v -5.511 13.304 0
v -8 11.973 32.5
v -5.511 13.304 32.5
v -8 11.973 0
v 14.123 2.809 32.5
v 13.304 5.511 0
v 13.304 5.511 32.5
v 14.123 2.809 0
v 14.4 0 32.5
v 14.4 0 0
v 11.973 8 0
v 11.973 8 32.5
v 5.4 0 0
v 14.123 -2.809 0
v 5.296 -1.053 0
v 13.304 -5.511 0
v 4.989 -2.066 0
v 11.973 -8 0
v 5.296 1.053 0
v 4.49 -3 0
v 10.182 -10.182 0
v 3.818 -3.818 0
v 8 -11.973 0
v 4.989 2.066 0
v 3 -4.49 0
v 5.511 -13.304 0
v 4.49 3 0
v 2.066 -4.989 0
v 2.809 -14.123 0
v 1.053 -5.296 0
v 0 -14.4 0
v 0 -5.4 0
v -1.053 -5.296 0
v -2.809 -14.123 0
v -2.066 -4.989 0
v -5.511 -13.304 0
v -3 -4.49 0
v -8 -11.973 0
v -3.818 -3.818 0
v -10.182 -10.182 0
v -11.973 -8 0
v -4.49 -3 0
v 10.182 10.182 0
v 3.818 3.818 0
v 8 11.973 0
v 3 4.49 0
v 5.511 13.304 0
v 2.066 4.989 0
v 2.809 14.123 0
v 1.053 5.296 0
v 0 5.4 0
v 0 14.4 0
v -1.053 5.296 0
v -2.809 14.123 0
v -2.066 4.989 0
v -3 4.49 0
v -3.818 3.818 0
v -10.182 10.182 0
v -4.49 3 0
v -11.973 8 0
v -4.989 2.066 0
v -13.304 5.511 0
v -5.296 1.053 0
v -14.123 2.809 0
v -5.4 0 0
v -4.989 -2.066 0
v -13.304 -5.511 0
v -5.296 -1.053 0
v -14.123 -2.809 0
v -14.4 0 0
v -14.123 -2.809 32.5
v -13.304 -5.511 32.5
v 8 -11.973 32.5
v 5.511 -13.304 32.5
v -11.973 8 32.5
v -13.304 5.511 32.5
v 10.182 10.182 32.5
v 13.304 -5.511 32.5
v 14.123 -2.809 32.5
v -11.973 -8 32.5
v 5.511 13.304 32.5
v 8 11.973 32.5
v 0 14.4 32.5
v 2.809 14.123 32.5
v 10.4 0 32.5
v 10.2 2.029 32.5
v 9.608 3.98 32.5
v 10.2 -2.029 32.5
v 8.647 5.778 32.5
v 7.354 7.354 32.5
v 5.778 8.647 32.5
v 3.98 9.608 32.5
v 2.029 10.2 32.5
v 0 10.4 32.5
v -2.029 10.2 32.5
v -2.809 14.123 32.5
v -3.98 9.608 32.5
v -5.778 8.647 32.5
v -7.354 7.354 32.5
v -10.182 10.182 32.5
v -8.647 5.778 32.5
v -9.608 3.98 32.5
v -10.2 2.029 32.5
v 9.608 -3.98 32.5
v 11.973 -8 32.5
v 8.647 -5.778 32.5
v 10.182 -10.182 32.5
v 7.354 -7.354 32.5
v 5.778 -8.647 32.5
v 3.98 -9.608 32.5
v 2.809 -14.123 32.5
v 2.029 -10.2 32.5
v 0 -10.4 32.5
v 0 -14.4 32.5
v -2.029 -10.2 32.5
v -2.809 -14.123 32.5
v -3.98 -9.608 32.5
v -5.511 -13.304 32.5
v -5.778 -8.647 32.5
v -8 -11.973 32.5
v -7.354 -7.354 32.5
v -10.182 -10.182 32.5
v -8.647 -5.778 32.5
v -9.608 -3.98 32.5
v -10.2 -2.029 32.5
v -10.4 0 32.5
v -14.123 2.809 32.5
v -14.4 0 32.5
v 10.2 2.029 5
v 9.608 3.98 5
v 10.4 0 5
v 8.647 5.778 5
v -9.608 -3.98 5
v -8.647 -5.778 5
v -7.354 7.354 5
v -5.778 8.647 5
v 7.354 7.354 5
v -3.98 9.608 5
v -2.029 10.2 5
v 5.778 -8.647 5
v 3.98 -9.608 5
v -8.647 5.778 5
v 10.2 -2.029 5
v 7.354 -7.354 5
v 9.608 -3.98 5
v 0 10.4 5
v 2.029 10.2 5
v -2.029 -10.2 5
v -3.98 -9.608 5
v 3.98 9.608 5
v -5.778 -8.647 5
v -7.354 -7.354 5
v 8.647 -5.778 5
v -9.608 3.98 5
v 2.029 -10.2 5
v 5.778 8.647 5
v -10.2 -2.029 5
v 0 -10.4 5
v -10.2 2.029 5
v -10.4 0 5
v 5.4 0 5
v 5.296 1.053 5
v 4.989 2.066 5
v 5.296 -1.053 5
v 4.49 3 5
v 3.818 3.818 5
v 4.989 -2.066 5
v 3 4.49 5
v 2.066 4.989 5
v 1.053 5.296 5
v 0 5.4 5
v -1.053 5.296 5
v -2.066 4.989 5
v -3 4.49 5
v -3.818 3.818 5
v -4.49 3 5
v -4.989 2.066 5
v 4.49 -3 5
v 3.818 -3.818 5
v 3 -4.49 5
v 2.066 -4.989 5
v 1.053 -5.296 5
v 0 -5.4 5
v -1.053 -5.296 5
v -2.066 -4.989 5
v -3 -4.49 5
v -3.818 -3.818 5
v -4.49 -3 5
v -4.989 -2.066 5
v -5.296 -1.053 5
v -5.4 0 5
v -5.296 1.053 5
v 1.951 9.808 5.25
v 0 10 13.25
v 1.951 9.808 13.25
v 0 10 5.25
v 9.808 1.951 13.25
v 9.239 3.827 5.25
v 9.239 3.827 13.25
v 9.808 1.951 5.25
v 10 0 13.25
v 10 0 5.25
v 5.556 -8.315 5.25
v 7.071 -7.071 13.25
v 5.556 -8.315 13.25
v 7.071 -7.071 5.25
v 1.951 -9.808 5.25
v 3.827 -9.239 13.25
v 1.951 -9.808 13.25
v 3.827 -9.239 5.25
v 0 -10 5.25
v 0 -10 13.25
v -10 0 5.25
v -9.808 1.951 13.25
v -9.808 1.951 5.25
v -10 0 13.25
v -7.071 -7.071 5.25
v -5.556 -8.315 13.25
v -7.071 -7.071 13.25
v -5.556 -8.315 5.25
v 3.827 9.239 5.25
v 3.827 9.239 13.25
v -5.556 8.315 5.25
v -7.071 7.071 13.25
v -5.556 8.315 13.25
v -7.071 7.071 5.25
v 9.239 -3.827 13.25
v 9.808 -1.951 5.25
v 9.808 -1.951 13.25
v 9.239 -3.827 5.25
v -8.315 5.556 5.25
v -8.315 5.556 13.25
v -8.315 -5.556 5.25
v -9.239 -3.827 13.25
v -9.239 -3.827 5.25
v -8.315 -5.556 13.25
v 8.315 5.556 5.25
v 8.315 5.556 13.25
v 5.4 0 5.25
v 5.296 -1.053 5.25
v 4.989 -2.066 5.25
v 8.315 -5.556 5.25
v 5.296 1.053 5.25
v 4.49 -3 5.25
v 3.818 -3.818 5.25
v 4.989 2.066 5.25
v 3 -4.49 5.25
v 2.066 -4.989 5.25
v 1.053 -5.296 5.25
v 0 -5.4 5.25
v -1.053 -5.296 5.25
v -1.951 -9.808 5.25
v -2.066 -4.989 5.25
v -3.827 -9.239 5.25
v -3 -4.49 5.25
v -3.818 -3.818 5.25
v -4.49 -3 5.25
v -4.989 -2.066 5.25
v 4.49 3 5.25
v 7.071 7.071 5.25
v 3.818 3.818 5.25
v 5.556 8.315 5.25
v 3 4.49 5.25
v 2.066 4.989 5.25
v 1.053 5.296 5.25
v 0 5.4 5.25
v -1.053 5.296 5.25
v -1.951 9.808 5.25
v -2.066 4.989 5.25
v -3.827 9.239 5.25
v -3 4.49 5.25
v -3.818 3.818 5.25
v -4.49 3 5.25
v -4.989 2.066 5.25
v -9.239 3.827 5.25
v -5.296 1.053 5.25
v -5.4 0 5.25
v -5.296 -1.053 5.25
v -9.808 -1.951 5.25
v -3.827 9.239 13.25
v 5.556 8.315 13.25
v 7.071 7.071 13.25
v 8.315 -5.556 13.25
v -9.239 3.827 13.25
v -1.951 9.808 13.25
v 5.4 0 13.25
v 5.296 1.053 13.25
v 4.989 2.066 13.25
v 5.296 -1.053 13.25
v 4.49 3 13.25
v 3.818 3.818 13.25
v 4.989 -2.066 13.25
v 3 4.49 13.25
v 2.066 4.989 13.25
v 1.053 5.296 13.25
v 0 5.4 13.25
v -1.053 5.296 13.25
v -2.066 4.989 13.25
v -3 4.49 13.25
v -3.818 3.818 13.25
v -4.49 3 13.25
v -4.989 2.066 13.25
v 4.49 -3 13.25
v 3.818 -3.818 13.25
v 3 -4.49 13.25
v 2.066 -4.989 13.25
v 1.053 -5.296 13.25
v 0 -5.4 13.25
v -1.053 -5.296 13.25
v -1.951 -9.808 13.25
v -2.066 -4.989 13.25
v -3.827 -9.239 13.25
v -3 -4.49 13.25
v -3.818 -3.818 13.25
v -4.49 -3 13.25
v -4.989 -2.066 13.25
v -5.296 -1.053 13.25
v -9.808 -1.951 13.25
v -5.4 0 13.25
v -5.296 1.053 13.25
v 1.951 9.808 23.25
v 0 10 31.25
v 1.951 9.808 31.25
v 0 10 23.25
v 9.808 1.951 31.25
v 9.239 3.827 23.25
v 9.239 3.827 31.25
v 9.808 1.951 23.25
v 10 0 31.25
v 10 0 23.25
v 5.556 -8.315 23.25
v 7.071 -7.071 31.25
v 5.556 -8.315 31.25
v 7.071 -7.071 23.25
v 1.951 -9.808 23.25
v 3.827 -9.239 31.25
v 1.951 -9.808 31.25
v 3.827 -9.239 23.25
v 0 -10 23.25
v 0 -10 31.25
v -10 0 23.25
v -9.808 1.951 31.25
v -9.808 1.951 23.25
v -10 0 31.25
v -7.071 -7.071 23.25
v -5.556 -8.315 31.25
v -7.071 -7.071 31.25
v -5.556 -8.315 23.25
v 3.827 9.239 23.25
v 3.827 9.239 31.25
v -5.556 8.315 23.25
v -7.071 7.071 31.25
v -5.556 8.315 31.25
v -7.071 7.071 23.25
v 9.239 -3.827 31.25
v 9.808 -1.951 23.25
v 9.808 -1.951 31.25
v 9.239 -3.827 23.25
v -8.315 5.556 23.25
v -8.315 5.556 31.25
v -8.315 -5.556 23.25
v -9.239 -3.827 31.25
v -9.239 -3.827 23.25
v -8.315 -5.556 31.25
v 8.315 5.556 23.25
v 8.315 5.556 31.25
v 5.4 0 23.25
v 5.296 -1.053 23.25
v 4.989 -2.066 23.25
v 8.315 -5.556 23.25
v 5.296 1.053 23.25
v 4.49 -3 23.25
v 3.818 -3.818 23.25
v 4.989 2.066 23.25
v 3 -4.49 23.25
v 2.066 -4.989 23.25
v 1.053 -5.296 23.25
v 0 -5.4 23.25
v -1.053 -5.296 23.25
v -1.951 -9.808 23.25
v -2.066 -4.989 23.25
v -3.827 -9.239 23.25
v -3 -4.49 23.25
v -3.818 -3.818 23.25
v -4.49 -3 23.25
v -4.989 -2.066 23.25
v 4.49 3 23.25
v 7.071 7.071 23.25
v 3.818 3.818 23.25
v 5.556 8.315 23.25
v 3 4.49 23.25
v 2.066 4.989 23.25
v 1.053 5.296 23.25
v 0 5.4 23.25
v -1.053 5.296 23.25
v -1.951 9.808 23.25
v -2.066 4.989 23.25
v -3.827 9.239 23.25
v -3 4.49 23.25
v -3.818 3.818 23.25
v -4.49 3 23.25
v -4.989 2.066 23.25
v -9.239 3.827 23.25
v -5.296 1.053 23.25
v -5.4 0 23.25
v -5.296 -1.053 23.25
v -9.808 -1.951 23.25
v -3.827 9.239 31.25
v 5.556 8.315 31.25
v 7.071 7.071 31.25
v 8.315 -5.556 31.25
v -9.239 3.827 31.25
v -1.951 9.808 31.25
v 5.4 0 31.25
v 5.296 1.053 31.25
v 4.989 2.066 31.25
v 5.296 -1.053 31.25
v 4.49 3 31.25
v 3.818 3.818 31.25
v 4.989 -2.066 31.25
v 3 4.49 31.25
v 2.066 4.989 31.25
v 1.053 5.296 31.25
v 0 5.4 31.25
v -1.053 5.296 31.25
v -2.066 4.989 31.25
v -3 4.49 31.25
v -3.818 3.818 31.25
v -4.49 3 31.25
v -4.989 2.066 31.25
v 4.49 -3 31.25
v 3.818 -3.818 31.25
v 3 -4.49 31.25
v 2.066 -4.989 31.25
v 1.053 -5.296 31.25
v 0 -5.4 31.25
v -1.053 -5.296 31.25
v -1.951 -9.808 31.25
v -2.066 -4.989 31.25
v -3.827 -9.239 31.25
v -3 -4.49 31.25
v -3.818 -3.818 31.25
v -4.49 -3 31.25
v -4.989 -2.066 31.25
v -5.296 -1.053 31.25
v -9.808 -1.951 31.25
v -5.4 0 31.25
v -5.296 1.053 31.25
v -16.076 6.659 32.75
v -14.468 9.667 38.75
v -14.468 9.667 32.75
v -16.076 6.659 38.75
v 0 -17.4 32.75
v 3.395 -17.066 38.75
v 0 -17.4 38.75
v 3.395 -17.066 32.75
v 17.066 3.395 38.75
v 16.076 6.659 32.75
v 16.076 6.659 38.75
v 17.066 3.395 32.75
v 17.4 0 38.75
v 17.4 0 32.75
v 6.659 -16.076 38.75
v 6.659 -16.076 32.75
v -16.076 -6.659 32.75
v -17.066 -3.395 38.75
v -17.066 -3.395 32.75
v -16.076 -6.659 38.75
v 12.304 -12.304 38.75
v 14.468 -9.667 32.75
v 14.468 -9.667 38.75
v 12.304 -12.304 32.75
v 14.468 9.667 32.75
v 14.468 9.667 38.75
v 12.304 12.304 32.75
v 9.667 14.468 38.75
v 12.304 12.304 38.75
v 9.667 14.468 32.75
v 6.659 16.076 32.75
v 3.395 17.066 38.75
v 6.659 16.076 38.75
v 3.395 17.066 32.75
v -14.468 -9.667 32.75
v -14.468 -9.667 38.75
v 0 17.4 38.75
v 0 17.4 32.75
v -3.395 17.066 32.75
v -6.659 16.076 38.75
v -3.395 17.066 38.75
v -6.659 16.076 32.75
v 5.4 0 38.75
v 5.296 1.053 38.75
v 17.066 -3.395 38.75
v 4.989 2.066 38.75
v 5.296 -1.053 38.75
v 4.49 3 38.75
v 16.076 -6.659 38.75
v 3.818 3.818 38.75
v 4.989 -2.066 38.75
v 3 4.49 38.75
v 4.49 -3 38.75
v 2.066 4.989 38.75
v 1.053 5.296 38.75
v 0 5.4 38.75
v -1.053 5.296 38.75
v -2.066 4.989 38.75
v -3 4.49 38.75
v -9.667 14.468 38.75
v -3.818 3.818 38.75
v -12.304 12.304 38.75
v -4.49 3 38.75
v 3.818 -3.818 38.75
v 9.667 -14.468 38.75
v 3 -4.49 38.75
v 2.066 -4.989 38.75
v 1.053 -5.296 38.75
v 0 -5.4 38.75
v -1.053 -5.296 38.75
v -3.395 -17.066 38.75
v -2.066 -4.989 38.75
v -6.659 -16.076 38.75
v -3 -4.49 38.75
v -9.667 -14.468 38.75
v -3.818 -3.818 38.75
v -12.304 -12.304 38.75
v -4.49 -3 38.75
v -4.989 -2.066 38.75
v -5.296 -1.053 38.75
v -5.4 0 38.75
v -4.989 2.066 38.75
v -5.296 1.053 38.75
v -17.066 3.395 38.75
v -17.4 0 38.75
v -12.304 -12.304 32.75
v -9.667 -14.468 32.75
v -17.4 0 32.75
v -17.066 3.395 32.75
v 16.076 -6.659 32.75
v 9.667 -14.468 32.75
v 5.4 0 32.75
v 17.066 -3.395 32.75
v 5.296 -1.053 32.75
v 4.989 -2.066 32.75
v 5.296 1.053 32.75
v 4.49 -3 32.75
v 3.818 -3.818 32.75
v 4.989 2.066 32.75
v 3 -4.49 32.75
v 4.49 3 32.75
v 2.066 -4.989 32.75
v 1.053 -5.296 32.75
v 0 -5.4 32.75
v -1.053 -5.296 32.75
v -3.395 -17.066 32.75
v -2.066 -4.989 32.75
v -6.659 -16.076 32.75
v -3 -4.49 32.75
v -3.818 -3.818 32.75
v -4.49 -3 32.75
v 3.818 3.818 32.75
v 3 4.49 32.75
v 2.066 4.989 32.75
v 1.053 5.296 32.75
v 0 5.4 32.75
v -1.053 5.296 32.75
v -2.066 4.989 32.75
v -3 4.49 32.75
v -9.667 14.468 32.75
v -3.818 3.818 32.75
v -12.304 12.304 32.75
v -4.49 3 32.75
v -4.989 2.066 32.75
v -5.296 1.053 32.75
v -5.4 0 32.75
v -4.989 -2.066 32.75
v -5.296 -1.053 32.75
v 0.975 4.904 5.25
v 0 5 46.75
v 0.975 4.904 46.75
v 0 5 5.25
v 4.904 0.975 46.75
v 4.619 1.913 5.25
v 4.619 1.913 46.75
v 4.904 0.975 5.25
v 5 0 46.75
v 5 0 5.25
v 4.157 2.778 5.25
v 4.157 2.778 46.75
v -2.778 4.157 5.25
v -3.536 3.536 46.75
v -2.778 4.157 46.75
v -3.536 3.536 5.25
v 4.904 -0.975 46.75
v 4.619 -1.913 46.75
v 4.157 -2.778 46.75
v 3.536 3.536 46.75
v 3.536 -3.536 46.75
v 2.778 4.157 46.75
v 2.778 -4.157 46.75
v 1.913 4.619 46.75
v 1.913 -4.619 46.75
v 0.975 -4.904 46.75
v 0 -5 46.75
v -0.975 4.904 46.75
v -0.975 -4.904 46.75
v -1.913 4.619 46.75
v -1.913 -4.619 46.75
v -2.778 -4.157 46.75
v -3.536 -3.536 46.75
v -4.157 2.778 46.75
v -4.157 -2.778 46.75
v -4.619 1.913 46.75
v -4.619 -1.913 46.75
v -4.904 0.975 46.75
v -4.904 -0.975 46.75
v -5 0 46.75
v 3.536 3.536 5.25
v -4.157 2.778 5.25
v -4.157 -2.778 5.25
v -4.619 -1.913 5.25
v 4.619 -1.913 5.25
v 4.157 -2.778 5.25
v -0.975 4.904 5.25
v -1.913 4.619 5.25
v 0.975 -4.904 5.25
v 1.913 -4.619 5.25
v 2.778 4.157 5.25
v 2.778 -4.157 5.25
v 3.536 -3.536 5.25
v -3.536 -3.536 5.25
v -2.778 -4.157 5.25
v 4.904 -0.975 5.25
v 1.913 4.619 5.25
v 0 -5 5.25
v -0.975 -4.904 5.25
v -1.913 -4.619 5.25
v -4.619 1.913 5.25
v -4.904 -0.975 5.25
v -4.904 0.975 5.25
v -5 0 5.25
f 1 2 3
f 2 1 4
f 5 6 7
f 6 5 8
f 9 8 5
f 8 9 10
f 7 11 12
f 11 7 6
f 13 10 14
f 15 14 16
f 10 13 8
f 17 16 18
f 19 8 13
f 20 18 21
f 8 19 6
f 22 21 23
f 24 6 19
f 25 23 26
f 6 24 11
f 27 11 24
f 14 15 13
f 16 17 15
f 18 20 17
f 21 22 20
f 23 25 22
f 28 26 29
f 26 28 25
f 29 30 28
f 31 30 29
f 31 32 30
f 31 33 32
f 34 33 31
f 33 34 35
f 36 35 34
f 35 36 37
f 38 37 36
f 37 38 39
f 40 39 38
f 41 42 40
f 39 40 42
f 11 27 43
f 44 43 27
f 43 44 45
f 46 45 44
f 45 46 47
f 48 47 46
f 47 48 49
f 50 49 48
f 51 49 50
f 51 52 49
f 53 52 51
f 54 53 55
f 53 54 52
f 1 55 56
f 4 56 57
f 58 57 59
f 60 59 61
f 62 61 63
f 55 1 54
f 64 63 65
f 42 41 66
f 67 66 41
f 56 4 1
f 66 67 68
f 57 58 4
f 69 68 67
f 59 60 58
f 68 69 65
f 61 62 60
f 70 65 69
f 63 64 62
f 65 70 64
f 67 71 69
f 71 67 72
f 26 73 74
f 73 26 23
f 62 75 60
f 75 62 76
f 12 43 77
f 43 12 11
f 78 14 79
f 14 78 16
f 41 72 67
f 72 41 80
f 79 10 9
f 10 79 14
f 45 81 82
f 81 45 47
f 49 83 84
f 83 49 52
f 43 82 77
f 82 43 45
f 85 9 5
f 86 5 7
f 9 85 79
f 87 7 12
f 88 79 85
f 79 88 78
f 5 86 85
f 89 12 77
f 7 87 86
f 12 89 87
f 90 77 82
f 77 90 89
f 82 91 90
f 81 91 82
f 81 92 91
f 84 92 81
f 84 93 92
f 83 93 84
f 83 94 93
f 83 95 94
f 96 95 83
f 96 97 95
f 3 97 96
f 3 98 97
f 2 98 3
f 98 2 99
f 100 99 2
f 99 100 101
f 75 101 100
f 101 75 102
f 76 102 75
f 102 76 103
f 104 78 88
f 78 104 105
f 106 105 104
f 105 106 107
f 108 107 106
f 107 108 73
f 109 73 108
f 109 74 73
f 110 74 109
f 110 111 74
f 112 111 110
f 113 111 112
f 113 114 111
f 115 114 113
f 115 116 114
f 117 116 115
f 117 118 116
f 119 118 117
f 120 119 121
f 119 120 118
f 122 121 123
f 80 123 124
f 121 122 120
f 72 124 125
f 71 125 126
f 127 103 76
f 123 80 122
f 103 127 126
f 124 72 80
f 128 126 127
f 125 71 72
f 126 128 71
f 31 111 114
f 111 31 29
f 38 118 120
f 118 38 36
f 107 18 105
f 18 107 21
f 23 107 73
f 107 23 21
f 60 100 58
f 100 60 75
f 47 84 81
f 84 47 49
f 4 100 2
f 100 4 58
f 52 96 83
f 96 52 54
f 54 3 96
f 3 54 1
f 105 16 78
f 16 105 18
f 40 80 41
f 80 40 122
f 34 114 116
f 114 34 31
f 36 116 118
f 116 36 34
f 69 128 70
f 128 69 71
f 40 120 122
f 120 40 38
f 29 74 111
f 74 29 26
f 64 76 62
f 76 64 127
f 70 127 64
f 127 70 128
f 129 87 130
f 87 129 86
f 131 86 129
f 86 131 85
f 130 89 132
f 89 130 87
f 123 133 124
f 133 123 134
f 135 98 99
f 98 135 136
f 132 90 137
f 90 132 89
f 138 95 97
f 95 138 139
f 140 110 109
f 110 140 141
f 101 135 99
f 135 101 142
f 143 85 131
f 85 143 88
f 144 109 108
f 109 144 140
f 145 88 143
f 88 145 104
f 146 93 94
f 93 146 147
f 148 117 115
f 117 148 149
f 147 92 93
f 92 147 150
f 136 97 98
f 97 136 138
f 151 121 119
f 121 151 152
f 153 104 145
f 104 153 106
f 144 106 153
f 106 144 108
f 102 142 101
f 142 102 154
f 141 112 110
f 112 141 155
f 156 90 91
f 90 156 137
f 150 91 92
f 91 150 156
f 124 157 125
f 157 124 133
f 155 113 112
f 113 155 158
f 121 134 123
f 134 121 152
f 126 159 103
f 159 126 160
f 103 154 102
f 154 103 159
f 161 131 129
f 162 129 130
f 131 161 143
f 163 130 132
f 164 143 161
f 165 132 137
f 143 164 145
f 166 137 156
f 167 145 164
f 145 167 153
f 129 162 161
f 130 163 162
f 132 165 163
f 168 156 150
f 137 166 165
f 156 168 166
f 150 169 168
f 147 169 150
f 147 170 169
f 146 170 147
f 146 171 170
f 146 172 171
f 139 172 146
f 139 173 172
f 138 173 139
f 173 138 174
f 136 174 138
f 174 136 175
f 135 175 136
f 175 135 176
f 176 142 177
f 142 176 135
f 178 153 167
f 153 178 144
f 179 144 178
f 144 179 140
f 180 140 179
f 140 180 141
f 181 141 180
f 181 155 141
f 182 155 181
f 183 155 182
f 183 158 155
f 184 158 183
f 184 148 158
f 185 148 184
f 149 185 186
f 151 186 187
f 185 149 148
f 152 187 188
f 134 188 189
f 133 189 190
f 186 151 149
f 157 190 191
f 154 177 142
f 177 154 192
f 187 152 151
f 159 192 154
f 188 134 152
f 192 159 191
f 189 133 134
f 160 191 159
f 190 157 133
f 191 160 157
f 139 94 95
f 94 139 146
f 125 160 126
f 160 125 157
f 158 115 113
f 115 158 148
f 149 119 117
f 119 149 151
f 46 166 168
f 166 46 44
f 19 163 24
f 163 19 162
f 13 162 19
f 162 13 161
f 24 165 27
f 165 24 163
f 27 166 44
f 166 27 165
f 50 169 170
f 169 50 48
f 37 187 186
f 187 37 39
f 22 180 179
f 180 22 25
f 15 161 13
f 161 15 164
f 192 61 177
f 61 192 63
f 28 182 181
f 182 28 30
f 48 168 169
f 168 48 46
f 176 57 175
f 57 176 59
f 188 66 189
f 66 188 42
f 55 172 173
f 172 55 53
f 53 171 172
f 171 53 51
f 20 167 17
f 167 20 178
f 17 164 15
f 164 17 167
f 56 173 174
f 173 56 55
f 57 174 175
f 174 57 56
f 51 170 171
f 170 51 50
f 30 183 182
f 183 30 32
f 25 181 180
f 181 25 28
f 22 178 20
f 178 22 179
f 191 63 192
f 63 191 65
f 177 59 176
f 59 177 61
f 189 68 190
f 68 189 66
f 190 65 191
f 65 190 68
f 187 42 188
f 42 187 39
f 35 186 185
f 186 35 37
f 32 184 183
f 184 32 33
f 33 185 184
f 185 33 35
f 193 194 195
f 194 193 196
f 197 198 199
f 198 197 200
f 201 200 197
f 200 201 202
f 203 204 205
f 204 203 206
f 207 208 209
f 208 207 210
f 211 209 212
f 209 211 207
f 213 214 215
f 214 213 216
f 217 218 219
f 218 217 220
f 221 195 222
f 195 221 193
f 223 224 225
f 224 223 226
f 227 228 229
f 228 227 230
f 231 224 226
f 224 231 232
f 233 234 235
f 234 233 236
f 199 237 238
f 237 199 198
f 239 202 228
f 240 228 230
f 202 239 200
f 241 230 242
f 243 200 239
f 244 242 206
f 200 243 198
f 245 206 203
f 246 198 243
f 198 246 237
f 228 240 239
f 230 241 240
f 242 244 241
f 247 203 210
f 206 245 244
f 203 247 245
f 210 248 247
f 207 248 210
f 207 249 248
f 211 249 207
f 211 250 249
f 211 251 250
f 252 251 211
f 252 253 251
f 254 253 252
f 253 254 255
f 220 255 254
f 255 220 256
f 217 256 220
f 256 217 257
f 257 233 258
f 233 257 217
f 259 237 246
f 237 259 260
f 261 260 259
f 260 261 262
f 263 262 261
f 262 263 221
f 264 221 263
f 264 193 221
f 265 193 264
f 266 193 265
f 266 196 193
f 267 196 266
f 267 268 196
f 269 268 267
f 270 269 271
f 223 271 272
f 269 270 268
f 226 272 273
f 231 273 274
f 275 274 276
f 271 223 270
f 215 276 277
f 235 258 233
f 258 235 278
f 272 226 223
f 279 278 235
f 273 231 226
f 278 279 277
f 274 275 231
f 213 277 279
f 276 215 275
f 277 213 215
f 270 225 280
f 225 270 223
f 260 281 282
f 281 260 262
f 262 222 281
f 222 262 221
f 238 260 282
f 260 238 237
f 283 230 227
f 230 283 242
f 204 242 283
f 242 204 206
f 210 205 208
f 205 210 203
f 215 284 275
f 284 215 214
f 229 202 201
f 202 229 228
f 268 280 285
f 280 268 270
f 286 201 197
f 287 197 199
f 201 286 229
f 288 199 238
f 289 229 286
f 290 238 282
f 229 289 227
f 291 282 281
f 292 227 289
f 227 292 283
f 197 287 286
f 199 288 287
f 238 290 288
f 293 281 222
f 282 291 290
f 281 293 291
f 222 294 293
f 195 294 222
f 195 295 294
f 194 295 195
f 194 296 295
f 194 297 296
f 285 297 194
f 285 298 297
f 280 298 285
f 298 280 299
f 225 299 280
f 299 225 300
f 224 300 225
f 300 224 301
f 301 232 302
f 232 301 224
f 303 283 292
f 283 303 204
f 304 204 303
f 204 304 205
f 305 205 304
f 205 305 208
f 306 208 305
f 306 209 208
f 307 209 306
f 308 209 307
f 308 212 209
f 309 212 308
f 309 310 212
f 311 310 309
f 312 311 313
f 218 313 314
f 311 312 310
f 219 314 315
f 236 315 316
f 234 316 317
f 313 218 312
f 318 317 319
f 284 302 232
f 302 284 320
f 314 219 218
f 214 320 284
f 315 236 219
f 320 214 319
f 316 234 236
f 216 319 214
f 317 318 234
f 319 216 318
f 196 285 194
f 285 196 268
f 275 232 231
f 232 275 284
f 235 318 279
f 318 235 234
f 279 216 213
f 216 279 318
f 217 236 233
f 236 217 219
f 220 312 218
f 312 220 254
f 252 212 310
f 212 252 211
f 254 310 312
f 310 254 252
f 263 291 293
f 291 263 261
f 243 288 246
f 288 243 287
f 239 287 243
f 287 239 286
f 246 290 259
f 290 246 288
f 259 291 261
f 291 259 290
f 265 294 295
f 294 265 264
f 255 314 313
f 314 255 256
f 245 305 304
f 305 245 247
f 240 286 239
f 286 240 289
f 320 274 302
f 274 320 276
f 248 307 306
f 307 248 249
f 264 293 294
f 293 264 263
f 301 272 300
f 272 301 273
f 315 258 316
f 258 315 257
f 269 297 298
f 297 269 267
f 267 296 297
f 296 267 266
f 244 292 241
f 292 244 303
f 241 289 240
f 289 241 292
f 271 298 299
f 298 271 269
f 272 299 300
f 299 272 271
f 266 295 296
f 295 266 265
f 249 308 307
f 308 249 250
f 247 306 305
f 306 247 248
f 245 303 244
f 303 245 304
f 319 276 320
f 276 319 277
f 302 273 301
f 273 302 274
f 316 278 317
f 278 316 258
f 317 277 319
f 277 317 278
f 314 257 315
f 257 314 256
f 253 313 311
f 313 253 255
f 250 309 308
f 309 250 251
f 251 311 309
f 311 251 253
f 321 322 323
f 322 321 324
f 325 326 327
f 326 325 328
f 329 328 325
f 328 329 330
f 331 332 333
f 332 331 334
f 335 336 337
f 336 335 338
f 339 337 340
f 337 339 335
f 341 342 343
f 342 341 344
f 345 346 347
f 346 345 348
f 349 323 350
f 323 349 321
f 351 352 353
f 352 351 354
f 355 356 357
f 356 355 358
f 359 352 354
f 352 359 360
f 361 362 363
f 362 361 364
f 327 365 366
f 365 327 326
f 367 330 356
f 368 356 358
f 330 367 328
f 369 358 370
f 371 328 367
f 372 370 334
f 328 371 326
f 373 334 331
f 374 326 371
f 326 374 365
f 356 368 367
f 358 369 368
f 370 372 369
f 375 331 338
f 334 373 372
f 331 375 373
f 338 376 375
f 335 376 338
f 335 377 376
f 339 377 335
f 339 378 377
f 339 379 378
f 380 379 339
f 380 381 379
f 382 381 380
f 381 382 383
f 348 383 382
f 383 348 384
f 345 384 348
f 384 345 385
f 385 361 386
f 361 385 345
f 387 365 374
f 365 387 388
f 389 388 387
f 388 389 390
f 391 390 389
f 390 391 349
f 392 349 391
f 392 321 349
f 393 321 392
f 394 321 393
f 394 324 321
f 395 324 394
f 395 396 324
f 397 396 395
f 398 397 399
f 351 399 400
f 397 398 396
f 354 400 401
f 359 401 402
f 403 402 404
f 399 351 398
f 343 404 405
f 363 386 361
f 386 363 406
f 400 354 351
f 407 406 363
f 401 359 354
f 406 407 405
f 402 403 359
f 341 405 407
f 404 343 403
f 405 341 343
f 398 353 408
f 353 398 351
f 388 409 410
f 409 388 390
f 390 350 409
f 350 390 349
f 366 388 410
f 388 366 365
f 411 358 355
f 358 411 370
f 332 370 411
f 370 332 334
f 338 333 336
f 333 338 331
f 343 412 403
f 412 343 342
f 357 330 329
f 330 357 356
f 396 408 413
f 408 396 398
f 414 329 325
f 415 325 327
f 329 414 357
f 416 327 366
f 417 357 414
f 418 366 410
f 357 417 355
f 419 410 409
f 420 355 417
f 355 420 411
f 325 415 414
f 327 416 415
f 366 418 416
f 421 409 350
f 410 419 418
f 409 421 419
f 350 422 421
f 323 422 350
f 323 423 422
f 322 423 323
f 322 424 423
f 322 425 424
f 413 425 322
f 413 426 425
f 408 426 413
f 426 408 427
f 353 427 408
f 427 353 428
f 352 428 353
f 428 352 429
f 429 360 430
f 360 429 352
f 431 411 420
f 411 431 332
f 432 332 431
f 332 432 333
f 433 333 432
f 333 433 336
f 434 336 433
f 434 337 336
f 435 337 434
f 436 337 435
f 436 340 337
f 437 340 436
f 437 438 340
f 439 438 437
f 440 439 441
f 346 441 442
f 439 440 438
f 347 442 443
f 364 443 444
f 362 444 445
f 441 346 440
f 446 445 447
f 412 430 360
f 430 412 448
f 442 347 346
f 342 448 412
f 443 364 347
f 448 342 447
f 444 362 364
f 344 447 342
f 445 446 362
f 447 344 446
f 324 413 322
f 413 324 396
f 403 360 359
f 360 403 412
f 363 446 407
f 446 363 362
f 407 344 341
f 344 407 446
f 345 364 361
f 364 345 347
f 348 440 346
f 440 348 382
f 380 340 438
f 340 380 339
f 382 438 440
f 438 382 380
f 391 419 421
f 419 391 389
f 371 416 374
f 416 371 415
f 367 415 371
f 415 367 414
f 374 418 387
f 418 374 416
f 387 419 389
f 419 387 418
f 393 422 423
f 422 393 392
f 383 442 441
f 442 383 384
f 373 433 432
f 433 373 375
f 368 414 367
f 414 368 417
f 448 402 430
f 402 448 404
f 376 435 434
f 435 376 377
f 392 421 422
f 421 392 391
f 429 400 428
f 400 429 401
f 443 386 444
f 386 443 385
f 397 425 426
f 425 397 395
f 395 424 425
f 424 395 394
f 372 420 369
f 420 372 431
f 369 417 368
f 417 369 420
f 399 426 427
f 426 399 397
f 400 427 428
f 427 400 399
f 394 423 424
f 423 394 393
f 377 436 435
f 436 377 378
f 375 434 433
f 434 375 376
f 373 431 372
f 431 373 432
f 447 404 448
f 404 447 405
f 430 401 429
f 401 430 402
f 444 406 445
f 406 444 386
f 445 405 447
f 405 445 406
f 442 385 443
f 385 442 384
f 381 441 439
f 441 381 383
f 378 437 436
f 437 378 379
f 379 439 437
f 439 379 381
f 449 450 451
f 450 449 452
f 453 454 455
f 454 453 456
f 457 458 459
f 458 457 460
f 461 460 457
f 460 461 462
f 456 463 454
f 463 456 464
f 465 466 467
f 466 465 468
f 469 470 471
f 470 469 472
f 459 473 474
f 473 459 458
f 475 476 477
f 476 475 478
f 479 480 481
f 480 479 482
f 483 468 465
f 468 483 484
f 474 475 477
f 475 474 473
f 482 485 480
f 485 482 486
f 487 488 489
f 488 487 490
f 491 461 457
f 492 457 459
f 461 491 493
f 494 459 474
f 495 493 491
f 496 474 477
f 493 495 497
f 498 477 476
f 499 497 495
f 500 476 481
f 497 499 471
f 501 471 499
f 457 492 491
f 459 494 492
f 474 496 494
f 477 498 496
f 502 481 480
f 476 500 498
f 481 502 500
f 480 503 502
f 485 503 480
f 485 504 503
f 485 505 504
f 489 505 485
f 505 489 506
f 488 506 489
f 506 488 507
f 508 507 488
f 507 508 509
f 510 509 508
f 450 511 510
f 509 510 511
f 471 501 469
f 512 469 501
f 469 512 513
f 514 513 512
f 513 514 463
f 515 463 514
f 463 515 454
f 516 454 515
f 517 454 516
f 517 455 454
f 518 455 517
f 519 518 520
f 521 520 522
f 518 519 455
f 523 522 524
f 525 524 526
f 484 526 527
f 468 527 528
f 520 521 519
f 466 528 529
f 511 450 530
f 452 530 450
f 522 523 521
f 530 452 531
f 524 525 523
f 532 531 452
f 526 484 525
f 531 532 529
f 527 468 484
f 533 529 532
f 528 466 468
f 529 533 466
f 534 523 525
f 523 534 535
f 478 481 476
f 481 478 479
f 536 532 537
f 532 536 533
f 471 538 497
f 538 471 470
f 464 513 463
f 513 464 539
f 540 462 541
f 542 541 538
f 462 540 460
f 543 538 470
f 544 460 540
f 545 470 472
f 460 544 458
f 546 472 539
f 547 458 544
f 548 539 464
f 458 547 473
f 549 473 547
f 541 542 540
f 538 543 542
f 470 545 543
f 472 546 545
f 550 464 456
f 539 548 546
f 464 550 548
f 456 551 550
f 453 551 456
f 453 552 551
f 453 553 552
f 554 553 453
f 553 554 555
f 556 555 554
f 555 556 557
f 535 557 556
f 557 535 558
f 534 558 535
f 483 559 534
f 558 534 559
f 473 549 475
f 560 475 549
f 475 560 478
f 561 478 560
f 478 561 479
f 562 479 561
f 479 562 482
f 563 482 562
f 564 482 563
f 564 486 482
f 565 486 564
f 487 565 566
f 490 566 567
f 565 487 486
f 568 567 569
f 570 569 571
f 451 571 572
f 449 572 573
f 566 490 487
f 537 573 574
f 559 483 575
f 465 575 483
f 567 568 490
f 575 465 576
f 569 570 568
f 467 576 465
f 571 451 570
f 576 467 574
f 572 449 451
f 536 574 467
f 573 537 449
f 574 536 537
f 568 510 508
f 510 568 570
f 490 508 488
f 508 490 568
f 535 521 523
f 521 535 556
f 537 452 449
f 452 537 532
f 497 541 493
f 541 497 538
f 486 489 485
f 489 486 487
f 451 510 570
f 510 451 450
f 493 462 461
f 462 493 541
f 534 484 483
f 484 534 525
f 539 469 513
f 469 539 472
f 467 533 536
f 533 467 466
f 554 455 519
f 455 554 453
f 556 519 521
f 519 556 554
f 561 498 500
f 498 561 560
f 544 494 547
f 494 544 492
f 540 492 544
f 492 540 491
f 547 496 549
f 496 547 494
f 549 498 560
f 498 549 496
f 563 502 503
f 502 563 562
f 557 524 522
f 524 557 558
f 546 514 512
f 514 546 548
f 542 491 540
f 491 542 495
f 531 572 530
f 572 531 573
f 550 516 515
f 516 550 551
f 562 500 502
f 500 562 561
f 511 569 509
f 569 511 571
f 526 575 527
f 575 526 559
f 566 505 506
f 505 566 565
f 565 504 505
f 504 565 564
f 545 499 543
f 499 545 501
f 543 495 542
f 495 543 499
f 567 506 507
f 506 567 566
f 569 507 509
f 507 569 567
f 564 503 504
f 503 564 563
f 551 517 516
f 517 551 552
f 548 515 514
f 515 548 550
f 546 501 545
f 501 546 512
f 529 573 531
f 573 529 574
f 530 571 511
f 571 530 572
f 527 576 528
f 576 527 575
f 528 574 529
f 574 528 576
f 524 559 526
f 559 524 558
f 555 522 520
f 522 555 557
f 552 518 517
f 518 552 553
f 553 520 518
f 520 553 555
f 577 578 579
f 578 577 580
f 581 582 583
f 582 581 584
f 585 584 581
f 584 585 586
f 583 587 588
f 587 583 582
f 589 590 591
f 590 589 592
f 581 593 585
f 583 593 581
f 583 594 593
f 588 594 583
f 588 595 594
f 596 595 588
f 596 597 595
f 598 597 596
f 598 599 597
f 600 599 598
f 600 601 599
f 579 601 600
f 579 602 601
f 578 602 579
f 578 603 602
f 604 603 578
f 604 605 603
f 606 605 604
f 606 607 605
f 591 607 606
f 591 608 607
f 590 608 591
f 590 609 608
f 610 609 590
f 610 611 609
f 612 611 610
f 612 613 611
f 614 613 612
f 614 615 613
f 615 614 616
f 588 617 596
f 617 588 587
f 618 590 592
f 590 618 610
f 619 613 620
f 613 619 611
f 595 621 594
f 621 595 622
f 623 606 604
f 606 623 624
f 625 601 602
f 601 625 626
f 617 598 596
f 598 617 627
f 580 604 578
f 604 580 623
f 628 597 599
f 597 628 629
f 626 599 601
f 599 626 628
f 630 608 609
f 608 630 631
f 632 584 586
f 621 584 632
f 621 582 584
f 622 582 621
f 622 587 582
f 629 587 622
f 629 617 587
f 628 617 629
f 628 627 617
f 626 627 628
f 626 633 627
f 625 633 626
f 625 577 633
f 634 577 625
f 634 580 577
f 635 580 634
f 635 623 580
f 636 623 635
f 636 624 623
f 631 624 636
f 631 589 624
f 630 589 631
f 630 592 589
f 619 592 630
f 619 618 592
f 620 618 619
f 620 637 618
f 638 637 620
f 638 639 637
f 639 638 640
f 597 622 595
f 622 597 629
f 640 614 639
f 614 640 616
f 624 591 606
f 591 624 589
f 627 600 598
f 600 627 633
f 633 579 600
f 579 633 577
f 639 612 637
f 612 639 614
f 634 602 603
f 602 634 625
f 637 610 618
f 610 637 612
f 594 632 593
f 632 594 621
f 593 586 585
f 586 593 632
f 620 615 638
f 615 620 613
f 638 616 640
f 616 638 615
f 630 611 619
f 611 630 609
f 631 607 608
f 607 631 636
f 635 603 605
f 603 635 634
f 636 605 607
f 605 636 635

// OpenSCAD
$fn = 32;

// ------------------------------------------------------------------------
// Shaft station: cup d28.8 x 32.5 mm, shaft d10
// Every part is its own module, assembly() places every instance.
// ------------------------------------------------------------------------

// --- part 1 ---
module housing_cup() {
  difference() {
    cylinder(h = 32.5, d = 28.8);
    translate([0, 0, 5]) cylinder(h = 28.5, d = 20.8);
    translate([0, 0, -1]) cylinder(h = 7, d = 10.8);
  }
}

// --- part 2 ---
module bearing_lower() {
  difference() {
      translate([0, 0, 0]) cylinder(h = 8, d = 20);
      translate([0, 0, -1]) cylinder(h = 10, d = 10.8);
    }
}

// --- part 3 ---
module bearing_upper() {
  difference() {
      translate([0, 0, 0]) cylinder(h = 8, d = 20);
      translate([0, 0, -1]) cylinder(h = 10, d = 10.8);
    }
}

// --- part 4 ---
module station_shaft() {
  translate([0, 0, -20.75]) cylinder(h = 41.5, d = 10);
}

// --- part 5 ---
module station_cover() {
  difference() {
    cylinder(h = 6, d = 34.8);
    translate([0, 0, -1]) cylinder(h = 8, d = 10.8);
  }
}

// --- assembly ---
module assembly() {
  color([0.80, 0.24, 0.20]) translate([0, 0, 0]) rotate([0, 0, 0]) housing_cup();
  color([0.20, 0.45, 0.75]) translate([0, 0, 5.25]) rotate([0, 0, 0]) bearing_lower();
  color([0.25, 0.62, 0.32]) translate([0, 0, 23.25]) rotate([0, 0, 0]) bearing_upper();
  color([0.92, 0.70, 0.18]) translate([0, 0, 26]) rotate([0, 0, 0]) station_shaft();
  color([0.58, 0.35, 0.70]) translate([0, 0, 32.75]) rotate([0, 0, 0]) station_cover();
}

assembly();
